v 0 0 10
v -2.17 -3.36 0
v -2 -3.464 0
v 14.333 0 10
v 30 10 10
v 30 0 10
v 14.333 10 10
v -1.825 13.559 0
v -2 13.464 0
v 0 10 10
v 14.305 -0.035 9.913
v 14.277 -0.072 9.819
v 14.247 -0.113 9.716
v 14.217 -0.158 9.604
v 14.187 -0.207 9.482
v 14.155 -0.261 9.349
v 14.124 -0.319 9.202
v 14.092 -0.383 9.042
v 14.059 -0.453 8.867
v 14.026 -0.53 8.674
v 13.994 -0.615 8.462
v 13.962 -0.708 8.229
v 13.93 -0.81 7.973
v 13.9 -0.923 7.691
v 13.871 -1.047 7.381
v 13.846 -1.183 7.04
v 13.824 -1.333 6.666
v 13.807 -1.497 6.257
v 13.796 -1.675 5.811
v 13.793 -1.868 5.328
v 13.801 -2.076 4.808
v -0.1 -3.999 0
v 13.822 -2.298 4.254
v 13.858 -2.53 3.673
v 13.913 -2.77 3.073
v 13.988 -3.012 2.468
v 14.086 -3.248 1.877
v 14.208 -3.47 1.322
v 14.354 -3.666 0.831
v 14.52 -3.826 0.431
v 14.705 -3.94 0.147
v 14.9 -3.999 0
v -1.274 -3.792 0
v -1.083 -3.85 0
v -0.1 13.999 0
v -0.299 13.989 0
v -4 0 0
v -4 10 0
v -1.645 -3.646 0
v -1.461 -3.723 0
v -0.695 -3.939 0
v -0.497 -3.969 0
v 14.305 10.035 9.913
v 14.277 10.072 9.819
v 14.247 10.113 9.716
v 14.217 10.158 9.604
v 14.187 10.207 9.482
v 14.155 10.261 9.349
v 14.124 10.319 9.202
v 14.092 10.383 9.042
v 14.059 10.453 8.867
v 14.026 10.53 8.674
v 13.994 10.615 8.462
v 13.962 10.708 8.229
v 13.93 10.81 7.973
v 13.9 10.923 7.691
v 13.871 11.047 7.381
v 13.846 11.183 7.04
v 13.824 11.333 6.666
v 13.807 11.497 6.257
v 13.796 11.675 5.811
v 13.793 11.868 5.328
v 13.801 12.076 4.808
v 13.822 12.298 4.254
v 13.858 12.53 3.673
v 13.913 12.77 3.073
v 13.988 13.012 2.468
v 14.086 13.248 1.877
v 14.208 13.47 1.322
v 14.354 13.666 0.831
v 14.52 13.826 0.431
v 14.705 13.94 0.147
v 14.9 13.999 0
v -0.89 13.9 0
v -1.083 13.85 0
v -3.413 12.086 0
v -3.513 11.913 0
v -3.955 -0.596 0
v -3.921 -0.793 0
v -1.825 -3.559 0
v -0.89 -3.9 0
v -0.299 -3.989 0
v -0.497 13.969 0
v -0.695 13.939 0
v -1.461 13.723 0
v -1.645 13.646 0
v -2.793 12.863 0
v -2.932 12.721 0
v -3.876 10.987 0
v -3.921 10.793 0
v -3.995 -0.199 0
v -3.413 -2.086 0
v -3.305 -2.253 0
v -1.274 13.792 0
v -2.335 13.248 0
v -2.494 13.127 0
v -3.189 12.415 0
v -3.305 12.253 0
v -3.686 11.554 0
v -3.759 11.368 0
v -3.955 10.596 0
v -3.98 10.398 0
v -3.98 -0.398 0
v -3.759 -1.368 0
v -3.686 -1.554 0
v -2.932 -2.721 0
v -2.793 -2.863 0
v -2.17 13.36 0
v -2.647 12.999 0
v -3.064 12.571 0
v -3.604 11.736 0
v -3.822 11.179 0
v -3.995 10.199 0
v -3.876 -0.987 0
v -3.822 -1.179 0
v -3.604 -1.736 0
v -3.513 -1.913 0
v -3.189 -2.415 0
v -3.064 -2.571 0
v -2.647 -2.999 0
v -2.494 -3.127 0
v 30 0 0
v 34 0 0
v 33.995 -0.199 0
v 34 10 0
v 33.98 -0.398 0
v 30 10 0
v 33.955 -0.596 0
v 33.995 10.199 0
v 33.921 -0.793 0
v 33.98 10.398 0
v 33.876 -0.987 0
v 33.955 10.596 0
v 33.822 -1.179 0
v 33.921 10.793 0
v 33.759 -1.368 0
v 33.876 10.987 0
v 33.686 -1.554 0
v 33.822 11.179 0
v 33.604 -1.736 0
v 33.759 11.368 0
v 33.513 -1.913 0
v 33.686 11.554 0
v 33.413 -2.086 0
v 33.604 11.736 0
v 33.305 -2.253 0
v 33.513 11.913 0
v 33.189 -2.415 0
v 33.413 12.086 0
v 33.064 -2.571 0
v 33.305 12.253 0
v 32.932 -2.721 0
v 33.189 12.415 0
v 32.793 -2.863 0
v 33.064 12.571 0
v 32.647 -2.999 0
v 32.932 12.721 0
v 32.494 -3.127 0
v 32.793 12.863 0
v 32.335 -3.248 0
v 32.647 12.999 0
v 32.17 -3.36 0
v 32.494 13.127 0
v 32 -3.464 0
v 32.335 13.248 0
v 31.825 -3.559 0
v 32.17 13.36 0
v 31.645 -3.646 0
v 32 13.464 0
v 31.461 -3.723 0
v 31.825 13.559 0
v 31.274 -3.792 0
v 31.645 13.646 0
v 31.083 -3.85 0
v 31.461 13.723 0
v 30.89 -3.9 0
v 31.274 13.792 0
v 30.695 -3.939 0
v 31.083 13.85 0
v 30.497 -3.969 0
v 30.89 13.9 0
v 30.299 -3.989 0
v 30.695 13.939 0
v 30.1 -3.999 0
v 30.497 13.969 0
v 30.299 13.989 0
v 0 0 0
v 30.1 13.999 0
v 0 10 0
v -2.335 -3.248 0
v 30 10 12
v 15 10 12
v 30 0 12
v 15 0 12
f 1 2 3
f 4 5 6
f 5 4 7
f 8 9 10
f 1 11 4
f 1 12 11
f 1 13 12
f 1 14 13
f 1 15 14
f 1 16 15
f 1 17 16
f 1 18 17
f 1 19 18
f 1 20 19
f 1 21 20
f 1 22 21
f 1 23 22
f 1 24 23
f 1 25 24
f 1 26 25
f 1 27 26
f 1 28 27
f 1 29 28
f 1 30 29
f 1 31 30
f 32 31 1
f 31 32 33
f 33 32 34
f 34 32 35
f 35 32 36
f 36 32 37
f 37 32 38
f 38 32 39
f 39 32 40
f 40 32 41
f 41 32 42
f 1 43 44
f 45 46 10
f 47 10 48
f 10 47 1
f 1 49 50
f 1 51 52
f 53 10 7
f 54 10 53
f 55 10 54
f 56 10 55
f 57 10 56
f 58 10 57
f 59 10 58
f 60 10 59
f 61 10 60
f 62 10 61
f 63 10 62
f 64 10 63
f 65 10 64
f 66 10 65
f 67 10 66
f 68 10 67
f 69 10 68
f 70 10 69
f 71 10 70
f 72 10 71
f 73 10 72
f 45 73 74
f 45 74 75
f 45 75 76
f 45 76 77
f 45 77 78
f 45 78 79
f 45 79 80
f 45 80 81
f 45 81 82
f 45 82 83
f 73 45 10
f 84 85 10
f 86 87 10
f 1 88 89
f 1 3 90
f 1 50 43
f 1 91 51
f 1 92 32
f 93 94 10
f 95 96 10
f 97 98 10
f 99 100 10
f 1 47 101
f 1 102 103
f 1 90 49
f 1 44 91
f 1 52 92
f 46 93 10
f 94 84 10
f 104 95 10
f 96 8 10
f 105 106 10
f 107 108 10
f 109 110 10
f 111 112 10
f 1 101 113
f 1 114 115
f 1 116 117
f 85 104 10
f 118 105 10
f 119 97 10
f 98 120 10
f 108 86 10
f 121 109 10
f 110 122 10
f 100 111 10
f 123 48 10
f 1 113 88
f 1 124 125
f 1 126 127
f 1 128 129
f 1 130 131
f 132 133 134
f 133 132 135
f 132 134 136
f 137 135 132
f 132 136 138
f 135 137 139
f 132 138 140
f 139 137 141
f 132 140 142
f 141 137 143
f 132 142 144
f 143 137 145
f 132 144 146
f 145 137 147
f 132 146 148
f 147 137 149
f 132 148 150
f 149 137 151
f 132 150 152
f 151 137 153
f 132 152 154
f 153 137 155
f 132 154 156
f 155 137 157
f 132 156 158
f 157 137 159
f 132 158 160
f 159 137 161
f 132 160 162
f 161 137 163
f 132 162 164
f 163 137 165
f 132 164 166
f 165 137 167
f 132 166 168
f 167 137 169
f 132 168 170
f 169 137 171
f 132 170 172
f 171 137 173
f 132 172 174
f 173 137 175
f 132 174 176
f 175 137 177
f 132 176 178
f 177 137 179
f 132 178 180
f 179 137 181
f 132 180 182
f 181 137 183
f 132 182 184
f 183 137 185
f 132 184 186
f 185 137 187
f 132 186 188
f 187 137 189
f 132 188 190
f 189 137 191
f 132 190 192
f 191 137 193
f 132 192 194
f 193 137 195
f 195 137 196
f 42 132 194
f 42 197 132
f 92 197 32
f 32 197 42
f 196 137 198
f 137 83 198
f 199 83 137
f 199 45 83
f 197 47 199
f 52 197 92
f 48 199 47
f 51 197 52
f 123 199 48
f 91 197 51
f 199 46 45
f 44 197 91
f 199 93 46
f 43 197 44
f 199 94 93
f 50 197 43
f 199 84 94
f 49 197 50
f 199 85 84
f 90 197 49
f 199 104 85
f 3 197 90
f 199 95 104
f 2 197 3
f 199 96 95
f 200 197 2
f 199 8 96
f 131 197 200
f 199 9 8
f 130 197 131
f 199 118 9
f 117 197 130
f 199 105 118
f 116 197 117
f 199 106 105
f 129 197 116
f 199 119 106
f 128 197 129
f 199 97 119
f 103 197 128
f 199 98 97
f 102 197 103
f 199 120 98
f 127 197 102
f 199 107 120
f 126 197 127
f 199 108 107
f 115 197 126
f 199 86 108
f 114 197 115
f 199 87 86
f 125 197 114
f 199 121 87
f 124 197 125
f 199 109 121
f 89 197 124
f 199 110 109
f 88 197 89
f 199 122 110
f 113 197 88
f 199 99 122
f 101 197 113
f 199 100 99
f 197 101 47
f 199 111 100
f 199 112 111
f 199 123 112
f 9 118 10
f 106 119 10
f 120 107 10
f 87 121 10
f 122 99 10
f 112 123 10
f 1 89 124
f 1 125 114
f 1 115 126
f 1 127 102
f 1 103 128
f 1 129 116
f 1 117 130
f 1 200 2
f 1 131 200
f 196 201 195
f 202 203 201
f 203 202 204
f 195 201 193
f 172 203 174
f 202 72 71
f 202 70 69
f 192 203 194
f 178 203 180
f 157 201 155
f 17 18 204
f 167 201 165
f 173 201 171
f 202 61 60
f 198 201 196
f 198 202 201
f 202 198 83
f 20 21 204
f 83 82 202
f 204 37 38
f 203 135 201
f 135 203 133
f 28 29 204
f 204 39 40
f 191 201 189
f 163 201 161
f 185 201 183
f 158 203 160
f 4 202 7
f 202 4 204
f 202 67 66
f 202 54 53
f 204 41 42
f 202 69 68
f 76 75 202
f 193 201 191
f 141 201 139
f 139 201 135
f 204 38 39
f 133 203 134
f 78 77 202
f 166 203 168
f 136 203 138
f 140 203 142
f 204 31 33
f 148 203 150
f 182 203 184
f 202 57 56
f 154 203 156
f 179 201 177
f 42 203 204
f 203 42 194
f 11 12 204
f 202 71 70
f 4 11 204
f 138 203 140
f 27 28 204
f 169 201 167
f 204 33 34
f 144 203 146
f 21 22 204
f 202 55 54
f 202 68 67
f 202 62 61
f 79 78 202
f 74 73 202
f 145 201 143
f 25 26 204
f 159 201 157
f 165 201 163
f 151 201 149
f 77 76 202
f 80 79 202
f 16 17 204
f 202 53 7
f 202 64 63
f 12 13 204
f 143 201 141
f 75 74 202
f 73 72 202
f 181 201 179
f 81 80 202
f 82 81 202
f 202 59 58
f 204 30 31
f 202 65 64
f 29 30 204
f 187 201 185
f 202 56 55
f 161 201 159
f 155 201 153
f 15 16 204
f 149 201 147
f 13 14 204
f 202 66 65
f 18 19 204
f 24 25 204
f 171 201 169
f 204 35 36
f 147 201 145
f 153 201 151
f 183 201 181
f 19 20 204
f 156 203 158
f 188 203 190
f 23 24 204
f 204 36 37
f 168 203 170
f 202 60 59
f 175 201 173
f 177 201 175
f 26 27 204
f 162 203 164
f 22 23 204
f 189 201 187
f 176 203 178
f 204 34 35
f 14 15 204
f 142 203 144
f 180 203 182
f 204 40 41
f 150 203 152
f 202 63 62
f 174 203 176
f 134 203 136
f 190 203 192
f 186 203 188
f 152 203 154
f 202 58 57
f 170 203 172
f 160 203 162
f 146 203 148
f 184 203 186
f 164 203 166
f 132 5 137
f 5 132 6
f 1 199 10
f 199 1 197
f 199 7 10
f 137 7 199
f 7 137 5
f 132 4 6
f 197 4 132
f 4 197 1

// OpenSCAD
$fs = 0.2;
$fa = 1;

difference() {
	union() {
		minkowski() {
			scale([1, 1, 0]) {
				cube([30, 10, 10]);
			}
			cylinder(r1=4, r2=0, h=10);
		}
		minkowski() {
			translate([15, 0, 0]) {
				scale([1, 1, 0]) {
					cube([15, 10, 2]);
				}
			}
			cylinder(r1=4, r2=0, h=12);
		}
	}
	cube([30, 10, 10]);
}
